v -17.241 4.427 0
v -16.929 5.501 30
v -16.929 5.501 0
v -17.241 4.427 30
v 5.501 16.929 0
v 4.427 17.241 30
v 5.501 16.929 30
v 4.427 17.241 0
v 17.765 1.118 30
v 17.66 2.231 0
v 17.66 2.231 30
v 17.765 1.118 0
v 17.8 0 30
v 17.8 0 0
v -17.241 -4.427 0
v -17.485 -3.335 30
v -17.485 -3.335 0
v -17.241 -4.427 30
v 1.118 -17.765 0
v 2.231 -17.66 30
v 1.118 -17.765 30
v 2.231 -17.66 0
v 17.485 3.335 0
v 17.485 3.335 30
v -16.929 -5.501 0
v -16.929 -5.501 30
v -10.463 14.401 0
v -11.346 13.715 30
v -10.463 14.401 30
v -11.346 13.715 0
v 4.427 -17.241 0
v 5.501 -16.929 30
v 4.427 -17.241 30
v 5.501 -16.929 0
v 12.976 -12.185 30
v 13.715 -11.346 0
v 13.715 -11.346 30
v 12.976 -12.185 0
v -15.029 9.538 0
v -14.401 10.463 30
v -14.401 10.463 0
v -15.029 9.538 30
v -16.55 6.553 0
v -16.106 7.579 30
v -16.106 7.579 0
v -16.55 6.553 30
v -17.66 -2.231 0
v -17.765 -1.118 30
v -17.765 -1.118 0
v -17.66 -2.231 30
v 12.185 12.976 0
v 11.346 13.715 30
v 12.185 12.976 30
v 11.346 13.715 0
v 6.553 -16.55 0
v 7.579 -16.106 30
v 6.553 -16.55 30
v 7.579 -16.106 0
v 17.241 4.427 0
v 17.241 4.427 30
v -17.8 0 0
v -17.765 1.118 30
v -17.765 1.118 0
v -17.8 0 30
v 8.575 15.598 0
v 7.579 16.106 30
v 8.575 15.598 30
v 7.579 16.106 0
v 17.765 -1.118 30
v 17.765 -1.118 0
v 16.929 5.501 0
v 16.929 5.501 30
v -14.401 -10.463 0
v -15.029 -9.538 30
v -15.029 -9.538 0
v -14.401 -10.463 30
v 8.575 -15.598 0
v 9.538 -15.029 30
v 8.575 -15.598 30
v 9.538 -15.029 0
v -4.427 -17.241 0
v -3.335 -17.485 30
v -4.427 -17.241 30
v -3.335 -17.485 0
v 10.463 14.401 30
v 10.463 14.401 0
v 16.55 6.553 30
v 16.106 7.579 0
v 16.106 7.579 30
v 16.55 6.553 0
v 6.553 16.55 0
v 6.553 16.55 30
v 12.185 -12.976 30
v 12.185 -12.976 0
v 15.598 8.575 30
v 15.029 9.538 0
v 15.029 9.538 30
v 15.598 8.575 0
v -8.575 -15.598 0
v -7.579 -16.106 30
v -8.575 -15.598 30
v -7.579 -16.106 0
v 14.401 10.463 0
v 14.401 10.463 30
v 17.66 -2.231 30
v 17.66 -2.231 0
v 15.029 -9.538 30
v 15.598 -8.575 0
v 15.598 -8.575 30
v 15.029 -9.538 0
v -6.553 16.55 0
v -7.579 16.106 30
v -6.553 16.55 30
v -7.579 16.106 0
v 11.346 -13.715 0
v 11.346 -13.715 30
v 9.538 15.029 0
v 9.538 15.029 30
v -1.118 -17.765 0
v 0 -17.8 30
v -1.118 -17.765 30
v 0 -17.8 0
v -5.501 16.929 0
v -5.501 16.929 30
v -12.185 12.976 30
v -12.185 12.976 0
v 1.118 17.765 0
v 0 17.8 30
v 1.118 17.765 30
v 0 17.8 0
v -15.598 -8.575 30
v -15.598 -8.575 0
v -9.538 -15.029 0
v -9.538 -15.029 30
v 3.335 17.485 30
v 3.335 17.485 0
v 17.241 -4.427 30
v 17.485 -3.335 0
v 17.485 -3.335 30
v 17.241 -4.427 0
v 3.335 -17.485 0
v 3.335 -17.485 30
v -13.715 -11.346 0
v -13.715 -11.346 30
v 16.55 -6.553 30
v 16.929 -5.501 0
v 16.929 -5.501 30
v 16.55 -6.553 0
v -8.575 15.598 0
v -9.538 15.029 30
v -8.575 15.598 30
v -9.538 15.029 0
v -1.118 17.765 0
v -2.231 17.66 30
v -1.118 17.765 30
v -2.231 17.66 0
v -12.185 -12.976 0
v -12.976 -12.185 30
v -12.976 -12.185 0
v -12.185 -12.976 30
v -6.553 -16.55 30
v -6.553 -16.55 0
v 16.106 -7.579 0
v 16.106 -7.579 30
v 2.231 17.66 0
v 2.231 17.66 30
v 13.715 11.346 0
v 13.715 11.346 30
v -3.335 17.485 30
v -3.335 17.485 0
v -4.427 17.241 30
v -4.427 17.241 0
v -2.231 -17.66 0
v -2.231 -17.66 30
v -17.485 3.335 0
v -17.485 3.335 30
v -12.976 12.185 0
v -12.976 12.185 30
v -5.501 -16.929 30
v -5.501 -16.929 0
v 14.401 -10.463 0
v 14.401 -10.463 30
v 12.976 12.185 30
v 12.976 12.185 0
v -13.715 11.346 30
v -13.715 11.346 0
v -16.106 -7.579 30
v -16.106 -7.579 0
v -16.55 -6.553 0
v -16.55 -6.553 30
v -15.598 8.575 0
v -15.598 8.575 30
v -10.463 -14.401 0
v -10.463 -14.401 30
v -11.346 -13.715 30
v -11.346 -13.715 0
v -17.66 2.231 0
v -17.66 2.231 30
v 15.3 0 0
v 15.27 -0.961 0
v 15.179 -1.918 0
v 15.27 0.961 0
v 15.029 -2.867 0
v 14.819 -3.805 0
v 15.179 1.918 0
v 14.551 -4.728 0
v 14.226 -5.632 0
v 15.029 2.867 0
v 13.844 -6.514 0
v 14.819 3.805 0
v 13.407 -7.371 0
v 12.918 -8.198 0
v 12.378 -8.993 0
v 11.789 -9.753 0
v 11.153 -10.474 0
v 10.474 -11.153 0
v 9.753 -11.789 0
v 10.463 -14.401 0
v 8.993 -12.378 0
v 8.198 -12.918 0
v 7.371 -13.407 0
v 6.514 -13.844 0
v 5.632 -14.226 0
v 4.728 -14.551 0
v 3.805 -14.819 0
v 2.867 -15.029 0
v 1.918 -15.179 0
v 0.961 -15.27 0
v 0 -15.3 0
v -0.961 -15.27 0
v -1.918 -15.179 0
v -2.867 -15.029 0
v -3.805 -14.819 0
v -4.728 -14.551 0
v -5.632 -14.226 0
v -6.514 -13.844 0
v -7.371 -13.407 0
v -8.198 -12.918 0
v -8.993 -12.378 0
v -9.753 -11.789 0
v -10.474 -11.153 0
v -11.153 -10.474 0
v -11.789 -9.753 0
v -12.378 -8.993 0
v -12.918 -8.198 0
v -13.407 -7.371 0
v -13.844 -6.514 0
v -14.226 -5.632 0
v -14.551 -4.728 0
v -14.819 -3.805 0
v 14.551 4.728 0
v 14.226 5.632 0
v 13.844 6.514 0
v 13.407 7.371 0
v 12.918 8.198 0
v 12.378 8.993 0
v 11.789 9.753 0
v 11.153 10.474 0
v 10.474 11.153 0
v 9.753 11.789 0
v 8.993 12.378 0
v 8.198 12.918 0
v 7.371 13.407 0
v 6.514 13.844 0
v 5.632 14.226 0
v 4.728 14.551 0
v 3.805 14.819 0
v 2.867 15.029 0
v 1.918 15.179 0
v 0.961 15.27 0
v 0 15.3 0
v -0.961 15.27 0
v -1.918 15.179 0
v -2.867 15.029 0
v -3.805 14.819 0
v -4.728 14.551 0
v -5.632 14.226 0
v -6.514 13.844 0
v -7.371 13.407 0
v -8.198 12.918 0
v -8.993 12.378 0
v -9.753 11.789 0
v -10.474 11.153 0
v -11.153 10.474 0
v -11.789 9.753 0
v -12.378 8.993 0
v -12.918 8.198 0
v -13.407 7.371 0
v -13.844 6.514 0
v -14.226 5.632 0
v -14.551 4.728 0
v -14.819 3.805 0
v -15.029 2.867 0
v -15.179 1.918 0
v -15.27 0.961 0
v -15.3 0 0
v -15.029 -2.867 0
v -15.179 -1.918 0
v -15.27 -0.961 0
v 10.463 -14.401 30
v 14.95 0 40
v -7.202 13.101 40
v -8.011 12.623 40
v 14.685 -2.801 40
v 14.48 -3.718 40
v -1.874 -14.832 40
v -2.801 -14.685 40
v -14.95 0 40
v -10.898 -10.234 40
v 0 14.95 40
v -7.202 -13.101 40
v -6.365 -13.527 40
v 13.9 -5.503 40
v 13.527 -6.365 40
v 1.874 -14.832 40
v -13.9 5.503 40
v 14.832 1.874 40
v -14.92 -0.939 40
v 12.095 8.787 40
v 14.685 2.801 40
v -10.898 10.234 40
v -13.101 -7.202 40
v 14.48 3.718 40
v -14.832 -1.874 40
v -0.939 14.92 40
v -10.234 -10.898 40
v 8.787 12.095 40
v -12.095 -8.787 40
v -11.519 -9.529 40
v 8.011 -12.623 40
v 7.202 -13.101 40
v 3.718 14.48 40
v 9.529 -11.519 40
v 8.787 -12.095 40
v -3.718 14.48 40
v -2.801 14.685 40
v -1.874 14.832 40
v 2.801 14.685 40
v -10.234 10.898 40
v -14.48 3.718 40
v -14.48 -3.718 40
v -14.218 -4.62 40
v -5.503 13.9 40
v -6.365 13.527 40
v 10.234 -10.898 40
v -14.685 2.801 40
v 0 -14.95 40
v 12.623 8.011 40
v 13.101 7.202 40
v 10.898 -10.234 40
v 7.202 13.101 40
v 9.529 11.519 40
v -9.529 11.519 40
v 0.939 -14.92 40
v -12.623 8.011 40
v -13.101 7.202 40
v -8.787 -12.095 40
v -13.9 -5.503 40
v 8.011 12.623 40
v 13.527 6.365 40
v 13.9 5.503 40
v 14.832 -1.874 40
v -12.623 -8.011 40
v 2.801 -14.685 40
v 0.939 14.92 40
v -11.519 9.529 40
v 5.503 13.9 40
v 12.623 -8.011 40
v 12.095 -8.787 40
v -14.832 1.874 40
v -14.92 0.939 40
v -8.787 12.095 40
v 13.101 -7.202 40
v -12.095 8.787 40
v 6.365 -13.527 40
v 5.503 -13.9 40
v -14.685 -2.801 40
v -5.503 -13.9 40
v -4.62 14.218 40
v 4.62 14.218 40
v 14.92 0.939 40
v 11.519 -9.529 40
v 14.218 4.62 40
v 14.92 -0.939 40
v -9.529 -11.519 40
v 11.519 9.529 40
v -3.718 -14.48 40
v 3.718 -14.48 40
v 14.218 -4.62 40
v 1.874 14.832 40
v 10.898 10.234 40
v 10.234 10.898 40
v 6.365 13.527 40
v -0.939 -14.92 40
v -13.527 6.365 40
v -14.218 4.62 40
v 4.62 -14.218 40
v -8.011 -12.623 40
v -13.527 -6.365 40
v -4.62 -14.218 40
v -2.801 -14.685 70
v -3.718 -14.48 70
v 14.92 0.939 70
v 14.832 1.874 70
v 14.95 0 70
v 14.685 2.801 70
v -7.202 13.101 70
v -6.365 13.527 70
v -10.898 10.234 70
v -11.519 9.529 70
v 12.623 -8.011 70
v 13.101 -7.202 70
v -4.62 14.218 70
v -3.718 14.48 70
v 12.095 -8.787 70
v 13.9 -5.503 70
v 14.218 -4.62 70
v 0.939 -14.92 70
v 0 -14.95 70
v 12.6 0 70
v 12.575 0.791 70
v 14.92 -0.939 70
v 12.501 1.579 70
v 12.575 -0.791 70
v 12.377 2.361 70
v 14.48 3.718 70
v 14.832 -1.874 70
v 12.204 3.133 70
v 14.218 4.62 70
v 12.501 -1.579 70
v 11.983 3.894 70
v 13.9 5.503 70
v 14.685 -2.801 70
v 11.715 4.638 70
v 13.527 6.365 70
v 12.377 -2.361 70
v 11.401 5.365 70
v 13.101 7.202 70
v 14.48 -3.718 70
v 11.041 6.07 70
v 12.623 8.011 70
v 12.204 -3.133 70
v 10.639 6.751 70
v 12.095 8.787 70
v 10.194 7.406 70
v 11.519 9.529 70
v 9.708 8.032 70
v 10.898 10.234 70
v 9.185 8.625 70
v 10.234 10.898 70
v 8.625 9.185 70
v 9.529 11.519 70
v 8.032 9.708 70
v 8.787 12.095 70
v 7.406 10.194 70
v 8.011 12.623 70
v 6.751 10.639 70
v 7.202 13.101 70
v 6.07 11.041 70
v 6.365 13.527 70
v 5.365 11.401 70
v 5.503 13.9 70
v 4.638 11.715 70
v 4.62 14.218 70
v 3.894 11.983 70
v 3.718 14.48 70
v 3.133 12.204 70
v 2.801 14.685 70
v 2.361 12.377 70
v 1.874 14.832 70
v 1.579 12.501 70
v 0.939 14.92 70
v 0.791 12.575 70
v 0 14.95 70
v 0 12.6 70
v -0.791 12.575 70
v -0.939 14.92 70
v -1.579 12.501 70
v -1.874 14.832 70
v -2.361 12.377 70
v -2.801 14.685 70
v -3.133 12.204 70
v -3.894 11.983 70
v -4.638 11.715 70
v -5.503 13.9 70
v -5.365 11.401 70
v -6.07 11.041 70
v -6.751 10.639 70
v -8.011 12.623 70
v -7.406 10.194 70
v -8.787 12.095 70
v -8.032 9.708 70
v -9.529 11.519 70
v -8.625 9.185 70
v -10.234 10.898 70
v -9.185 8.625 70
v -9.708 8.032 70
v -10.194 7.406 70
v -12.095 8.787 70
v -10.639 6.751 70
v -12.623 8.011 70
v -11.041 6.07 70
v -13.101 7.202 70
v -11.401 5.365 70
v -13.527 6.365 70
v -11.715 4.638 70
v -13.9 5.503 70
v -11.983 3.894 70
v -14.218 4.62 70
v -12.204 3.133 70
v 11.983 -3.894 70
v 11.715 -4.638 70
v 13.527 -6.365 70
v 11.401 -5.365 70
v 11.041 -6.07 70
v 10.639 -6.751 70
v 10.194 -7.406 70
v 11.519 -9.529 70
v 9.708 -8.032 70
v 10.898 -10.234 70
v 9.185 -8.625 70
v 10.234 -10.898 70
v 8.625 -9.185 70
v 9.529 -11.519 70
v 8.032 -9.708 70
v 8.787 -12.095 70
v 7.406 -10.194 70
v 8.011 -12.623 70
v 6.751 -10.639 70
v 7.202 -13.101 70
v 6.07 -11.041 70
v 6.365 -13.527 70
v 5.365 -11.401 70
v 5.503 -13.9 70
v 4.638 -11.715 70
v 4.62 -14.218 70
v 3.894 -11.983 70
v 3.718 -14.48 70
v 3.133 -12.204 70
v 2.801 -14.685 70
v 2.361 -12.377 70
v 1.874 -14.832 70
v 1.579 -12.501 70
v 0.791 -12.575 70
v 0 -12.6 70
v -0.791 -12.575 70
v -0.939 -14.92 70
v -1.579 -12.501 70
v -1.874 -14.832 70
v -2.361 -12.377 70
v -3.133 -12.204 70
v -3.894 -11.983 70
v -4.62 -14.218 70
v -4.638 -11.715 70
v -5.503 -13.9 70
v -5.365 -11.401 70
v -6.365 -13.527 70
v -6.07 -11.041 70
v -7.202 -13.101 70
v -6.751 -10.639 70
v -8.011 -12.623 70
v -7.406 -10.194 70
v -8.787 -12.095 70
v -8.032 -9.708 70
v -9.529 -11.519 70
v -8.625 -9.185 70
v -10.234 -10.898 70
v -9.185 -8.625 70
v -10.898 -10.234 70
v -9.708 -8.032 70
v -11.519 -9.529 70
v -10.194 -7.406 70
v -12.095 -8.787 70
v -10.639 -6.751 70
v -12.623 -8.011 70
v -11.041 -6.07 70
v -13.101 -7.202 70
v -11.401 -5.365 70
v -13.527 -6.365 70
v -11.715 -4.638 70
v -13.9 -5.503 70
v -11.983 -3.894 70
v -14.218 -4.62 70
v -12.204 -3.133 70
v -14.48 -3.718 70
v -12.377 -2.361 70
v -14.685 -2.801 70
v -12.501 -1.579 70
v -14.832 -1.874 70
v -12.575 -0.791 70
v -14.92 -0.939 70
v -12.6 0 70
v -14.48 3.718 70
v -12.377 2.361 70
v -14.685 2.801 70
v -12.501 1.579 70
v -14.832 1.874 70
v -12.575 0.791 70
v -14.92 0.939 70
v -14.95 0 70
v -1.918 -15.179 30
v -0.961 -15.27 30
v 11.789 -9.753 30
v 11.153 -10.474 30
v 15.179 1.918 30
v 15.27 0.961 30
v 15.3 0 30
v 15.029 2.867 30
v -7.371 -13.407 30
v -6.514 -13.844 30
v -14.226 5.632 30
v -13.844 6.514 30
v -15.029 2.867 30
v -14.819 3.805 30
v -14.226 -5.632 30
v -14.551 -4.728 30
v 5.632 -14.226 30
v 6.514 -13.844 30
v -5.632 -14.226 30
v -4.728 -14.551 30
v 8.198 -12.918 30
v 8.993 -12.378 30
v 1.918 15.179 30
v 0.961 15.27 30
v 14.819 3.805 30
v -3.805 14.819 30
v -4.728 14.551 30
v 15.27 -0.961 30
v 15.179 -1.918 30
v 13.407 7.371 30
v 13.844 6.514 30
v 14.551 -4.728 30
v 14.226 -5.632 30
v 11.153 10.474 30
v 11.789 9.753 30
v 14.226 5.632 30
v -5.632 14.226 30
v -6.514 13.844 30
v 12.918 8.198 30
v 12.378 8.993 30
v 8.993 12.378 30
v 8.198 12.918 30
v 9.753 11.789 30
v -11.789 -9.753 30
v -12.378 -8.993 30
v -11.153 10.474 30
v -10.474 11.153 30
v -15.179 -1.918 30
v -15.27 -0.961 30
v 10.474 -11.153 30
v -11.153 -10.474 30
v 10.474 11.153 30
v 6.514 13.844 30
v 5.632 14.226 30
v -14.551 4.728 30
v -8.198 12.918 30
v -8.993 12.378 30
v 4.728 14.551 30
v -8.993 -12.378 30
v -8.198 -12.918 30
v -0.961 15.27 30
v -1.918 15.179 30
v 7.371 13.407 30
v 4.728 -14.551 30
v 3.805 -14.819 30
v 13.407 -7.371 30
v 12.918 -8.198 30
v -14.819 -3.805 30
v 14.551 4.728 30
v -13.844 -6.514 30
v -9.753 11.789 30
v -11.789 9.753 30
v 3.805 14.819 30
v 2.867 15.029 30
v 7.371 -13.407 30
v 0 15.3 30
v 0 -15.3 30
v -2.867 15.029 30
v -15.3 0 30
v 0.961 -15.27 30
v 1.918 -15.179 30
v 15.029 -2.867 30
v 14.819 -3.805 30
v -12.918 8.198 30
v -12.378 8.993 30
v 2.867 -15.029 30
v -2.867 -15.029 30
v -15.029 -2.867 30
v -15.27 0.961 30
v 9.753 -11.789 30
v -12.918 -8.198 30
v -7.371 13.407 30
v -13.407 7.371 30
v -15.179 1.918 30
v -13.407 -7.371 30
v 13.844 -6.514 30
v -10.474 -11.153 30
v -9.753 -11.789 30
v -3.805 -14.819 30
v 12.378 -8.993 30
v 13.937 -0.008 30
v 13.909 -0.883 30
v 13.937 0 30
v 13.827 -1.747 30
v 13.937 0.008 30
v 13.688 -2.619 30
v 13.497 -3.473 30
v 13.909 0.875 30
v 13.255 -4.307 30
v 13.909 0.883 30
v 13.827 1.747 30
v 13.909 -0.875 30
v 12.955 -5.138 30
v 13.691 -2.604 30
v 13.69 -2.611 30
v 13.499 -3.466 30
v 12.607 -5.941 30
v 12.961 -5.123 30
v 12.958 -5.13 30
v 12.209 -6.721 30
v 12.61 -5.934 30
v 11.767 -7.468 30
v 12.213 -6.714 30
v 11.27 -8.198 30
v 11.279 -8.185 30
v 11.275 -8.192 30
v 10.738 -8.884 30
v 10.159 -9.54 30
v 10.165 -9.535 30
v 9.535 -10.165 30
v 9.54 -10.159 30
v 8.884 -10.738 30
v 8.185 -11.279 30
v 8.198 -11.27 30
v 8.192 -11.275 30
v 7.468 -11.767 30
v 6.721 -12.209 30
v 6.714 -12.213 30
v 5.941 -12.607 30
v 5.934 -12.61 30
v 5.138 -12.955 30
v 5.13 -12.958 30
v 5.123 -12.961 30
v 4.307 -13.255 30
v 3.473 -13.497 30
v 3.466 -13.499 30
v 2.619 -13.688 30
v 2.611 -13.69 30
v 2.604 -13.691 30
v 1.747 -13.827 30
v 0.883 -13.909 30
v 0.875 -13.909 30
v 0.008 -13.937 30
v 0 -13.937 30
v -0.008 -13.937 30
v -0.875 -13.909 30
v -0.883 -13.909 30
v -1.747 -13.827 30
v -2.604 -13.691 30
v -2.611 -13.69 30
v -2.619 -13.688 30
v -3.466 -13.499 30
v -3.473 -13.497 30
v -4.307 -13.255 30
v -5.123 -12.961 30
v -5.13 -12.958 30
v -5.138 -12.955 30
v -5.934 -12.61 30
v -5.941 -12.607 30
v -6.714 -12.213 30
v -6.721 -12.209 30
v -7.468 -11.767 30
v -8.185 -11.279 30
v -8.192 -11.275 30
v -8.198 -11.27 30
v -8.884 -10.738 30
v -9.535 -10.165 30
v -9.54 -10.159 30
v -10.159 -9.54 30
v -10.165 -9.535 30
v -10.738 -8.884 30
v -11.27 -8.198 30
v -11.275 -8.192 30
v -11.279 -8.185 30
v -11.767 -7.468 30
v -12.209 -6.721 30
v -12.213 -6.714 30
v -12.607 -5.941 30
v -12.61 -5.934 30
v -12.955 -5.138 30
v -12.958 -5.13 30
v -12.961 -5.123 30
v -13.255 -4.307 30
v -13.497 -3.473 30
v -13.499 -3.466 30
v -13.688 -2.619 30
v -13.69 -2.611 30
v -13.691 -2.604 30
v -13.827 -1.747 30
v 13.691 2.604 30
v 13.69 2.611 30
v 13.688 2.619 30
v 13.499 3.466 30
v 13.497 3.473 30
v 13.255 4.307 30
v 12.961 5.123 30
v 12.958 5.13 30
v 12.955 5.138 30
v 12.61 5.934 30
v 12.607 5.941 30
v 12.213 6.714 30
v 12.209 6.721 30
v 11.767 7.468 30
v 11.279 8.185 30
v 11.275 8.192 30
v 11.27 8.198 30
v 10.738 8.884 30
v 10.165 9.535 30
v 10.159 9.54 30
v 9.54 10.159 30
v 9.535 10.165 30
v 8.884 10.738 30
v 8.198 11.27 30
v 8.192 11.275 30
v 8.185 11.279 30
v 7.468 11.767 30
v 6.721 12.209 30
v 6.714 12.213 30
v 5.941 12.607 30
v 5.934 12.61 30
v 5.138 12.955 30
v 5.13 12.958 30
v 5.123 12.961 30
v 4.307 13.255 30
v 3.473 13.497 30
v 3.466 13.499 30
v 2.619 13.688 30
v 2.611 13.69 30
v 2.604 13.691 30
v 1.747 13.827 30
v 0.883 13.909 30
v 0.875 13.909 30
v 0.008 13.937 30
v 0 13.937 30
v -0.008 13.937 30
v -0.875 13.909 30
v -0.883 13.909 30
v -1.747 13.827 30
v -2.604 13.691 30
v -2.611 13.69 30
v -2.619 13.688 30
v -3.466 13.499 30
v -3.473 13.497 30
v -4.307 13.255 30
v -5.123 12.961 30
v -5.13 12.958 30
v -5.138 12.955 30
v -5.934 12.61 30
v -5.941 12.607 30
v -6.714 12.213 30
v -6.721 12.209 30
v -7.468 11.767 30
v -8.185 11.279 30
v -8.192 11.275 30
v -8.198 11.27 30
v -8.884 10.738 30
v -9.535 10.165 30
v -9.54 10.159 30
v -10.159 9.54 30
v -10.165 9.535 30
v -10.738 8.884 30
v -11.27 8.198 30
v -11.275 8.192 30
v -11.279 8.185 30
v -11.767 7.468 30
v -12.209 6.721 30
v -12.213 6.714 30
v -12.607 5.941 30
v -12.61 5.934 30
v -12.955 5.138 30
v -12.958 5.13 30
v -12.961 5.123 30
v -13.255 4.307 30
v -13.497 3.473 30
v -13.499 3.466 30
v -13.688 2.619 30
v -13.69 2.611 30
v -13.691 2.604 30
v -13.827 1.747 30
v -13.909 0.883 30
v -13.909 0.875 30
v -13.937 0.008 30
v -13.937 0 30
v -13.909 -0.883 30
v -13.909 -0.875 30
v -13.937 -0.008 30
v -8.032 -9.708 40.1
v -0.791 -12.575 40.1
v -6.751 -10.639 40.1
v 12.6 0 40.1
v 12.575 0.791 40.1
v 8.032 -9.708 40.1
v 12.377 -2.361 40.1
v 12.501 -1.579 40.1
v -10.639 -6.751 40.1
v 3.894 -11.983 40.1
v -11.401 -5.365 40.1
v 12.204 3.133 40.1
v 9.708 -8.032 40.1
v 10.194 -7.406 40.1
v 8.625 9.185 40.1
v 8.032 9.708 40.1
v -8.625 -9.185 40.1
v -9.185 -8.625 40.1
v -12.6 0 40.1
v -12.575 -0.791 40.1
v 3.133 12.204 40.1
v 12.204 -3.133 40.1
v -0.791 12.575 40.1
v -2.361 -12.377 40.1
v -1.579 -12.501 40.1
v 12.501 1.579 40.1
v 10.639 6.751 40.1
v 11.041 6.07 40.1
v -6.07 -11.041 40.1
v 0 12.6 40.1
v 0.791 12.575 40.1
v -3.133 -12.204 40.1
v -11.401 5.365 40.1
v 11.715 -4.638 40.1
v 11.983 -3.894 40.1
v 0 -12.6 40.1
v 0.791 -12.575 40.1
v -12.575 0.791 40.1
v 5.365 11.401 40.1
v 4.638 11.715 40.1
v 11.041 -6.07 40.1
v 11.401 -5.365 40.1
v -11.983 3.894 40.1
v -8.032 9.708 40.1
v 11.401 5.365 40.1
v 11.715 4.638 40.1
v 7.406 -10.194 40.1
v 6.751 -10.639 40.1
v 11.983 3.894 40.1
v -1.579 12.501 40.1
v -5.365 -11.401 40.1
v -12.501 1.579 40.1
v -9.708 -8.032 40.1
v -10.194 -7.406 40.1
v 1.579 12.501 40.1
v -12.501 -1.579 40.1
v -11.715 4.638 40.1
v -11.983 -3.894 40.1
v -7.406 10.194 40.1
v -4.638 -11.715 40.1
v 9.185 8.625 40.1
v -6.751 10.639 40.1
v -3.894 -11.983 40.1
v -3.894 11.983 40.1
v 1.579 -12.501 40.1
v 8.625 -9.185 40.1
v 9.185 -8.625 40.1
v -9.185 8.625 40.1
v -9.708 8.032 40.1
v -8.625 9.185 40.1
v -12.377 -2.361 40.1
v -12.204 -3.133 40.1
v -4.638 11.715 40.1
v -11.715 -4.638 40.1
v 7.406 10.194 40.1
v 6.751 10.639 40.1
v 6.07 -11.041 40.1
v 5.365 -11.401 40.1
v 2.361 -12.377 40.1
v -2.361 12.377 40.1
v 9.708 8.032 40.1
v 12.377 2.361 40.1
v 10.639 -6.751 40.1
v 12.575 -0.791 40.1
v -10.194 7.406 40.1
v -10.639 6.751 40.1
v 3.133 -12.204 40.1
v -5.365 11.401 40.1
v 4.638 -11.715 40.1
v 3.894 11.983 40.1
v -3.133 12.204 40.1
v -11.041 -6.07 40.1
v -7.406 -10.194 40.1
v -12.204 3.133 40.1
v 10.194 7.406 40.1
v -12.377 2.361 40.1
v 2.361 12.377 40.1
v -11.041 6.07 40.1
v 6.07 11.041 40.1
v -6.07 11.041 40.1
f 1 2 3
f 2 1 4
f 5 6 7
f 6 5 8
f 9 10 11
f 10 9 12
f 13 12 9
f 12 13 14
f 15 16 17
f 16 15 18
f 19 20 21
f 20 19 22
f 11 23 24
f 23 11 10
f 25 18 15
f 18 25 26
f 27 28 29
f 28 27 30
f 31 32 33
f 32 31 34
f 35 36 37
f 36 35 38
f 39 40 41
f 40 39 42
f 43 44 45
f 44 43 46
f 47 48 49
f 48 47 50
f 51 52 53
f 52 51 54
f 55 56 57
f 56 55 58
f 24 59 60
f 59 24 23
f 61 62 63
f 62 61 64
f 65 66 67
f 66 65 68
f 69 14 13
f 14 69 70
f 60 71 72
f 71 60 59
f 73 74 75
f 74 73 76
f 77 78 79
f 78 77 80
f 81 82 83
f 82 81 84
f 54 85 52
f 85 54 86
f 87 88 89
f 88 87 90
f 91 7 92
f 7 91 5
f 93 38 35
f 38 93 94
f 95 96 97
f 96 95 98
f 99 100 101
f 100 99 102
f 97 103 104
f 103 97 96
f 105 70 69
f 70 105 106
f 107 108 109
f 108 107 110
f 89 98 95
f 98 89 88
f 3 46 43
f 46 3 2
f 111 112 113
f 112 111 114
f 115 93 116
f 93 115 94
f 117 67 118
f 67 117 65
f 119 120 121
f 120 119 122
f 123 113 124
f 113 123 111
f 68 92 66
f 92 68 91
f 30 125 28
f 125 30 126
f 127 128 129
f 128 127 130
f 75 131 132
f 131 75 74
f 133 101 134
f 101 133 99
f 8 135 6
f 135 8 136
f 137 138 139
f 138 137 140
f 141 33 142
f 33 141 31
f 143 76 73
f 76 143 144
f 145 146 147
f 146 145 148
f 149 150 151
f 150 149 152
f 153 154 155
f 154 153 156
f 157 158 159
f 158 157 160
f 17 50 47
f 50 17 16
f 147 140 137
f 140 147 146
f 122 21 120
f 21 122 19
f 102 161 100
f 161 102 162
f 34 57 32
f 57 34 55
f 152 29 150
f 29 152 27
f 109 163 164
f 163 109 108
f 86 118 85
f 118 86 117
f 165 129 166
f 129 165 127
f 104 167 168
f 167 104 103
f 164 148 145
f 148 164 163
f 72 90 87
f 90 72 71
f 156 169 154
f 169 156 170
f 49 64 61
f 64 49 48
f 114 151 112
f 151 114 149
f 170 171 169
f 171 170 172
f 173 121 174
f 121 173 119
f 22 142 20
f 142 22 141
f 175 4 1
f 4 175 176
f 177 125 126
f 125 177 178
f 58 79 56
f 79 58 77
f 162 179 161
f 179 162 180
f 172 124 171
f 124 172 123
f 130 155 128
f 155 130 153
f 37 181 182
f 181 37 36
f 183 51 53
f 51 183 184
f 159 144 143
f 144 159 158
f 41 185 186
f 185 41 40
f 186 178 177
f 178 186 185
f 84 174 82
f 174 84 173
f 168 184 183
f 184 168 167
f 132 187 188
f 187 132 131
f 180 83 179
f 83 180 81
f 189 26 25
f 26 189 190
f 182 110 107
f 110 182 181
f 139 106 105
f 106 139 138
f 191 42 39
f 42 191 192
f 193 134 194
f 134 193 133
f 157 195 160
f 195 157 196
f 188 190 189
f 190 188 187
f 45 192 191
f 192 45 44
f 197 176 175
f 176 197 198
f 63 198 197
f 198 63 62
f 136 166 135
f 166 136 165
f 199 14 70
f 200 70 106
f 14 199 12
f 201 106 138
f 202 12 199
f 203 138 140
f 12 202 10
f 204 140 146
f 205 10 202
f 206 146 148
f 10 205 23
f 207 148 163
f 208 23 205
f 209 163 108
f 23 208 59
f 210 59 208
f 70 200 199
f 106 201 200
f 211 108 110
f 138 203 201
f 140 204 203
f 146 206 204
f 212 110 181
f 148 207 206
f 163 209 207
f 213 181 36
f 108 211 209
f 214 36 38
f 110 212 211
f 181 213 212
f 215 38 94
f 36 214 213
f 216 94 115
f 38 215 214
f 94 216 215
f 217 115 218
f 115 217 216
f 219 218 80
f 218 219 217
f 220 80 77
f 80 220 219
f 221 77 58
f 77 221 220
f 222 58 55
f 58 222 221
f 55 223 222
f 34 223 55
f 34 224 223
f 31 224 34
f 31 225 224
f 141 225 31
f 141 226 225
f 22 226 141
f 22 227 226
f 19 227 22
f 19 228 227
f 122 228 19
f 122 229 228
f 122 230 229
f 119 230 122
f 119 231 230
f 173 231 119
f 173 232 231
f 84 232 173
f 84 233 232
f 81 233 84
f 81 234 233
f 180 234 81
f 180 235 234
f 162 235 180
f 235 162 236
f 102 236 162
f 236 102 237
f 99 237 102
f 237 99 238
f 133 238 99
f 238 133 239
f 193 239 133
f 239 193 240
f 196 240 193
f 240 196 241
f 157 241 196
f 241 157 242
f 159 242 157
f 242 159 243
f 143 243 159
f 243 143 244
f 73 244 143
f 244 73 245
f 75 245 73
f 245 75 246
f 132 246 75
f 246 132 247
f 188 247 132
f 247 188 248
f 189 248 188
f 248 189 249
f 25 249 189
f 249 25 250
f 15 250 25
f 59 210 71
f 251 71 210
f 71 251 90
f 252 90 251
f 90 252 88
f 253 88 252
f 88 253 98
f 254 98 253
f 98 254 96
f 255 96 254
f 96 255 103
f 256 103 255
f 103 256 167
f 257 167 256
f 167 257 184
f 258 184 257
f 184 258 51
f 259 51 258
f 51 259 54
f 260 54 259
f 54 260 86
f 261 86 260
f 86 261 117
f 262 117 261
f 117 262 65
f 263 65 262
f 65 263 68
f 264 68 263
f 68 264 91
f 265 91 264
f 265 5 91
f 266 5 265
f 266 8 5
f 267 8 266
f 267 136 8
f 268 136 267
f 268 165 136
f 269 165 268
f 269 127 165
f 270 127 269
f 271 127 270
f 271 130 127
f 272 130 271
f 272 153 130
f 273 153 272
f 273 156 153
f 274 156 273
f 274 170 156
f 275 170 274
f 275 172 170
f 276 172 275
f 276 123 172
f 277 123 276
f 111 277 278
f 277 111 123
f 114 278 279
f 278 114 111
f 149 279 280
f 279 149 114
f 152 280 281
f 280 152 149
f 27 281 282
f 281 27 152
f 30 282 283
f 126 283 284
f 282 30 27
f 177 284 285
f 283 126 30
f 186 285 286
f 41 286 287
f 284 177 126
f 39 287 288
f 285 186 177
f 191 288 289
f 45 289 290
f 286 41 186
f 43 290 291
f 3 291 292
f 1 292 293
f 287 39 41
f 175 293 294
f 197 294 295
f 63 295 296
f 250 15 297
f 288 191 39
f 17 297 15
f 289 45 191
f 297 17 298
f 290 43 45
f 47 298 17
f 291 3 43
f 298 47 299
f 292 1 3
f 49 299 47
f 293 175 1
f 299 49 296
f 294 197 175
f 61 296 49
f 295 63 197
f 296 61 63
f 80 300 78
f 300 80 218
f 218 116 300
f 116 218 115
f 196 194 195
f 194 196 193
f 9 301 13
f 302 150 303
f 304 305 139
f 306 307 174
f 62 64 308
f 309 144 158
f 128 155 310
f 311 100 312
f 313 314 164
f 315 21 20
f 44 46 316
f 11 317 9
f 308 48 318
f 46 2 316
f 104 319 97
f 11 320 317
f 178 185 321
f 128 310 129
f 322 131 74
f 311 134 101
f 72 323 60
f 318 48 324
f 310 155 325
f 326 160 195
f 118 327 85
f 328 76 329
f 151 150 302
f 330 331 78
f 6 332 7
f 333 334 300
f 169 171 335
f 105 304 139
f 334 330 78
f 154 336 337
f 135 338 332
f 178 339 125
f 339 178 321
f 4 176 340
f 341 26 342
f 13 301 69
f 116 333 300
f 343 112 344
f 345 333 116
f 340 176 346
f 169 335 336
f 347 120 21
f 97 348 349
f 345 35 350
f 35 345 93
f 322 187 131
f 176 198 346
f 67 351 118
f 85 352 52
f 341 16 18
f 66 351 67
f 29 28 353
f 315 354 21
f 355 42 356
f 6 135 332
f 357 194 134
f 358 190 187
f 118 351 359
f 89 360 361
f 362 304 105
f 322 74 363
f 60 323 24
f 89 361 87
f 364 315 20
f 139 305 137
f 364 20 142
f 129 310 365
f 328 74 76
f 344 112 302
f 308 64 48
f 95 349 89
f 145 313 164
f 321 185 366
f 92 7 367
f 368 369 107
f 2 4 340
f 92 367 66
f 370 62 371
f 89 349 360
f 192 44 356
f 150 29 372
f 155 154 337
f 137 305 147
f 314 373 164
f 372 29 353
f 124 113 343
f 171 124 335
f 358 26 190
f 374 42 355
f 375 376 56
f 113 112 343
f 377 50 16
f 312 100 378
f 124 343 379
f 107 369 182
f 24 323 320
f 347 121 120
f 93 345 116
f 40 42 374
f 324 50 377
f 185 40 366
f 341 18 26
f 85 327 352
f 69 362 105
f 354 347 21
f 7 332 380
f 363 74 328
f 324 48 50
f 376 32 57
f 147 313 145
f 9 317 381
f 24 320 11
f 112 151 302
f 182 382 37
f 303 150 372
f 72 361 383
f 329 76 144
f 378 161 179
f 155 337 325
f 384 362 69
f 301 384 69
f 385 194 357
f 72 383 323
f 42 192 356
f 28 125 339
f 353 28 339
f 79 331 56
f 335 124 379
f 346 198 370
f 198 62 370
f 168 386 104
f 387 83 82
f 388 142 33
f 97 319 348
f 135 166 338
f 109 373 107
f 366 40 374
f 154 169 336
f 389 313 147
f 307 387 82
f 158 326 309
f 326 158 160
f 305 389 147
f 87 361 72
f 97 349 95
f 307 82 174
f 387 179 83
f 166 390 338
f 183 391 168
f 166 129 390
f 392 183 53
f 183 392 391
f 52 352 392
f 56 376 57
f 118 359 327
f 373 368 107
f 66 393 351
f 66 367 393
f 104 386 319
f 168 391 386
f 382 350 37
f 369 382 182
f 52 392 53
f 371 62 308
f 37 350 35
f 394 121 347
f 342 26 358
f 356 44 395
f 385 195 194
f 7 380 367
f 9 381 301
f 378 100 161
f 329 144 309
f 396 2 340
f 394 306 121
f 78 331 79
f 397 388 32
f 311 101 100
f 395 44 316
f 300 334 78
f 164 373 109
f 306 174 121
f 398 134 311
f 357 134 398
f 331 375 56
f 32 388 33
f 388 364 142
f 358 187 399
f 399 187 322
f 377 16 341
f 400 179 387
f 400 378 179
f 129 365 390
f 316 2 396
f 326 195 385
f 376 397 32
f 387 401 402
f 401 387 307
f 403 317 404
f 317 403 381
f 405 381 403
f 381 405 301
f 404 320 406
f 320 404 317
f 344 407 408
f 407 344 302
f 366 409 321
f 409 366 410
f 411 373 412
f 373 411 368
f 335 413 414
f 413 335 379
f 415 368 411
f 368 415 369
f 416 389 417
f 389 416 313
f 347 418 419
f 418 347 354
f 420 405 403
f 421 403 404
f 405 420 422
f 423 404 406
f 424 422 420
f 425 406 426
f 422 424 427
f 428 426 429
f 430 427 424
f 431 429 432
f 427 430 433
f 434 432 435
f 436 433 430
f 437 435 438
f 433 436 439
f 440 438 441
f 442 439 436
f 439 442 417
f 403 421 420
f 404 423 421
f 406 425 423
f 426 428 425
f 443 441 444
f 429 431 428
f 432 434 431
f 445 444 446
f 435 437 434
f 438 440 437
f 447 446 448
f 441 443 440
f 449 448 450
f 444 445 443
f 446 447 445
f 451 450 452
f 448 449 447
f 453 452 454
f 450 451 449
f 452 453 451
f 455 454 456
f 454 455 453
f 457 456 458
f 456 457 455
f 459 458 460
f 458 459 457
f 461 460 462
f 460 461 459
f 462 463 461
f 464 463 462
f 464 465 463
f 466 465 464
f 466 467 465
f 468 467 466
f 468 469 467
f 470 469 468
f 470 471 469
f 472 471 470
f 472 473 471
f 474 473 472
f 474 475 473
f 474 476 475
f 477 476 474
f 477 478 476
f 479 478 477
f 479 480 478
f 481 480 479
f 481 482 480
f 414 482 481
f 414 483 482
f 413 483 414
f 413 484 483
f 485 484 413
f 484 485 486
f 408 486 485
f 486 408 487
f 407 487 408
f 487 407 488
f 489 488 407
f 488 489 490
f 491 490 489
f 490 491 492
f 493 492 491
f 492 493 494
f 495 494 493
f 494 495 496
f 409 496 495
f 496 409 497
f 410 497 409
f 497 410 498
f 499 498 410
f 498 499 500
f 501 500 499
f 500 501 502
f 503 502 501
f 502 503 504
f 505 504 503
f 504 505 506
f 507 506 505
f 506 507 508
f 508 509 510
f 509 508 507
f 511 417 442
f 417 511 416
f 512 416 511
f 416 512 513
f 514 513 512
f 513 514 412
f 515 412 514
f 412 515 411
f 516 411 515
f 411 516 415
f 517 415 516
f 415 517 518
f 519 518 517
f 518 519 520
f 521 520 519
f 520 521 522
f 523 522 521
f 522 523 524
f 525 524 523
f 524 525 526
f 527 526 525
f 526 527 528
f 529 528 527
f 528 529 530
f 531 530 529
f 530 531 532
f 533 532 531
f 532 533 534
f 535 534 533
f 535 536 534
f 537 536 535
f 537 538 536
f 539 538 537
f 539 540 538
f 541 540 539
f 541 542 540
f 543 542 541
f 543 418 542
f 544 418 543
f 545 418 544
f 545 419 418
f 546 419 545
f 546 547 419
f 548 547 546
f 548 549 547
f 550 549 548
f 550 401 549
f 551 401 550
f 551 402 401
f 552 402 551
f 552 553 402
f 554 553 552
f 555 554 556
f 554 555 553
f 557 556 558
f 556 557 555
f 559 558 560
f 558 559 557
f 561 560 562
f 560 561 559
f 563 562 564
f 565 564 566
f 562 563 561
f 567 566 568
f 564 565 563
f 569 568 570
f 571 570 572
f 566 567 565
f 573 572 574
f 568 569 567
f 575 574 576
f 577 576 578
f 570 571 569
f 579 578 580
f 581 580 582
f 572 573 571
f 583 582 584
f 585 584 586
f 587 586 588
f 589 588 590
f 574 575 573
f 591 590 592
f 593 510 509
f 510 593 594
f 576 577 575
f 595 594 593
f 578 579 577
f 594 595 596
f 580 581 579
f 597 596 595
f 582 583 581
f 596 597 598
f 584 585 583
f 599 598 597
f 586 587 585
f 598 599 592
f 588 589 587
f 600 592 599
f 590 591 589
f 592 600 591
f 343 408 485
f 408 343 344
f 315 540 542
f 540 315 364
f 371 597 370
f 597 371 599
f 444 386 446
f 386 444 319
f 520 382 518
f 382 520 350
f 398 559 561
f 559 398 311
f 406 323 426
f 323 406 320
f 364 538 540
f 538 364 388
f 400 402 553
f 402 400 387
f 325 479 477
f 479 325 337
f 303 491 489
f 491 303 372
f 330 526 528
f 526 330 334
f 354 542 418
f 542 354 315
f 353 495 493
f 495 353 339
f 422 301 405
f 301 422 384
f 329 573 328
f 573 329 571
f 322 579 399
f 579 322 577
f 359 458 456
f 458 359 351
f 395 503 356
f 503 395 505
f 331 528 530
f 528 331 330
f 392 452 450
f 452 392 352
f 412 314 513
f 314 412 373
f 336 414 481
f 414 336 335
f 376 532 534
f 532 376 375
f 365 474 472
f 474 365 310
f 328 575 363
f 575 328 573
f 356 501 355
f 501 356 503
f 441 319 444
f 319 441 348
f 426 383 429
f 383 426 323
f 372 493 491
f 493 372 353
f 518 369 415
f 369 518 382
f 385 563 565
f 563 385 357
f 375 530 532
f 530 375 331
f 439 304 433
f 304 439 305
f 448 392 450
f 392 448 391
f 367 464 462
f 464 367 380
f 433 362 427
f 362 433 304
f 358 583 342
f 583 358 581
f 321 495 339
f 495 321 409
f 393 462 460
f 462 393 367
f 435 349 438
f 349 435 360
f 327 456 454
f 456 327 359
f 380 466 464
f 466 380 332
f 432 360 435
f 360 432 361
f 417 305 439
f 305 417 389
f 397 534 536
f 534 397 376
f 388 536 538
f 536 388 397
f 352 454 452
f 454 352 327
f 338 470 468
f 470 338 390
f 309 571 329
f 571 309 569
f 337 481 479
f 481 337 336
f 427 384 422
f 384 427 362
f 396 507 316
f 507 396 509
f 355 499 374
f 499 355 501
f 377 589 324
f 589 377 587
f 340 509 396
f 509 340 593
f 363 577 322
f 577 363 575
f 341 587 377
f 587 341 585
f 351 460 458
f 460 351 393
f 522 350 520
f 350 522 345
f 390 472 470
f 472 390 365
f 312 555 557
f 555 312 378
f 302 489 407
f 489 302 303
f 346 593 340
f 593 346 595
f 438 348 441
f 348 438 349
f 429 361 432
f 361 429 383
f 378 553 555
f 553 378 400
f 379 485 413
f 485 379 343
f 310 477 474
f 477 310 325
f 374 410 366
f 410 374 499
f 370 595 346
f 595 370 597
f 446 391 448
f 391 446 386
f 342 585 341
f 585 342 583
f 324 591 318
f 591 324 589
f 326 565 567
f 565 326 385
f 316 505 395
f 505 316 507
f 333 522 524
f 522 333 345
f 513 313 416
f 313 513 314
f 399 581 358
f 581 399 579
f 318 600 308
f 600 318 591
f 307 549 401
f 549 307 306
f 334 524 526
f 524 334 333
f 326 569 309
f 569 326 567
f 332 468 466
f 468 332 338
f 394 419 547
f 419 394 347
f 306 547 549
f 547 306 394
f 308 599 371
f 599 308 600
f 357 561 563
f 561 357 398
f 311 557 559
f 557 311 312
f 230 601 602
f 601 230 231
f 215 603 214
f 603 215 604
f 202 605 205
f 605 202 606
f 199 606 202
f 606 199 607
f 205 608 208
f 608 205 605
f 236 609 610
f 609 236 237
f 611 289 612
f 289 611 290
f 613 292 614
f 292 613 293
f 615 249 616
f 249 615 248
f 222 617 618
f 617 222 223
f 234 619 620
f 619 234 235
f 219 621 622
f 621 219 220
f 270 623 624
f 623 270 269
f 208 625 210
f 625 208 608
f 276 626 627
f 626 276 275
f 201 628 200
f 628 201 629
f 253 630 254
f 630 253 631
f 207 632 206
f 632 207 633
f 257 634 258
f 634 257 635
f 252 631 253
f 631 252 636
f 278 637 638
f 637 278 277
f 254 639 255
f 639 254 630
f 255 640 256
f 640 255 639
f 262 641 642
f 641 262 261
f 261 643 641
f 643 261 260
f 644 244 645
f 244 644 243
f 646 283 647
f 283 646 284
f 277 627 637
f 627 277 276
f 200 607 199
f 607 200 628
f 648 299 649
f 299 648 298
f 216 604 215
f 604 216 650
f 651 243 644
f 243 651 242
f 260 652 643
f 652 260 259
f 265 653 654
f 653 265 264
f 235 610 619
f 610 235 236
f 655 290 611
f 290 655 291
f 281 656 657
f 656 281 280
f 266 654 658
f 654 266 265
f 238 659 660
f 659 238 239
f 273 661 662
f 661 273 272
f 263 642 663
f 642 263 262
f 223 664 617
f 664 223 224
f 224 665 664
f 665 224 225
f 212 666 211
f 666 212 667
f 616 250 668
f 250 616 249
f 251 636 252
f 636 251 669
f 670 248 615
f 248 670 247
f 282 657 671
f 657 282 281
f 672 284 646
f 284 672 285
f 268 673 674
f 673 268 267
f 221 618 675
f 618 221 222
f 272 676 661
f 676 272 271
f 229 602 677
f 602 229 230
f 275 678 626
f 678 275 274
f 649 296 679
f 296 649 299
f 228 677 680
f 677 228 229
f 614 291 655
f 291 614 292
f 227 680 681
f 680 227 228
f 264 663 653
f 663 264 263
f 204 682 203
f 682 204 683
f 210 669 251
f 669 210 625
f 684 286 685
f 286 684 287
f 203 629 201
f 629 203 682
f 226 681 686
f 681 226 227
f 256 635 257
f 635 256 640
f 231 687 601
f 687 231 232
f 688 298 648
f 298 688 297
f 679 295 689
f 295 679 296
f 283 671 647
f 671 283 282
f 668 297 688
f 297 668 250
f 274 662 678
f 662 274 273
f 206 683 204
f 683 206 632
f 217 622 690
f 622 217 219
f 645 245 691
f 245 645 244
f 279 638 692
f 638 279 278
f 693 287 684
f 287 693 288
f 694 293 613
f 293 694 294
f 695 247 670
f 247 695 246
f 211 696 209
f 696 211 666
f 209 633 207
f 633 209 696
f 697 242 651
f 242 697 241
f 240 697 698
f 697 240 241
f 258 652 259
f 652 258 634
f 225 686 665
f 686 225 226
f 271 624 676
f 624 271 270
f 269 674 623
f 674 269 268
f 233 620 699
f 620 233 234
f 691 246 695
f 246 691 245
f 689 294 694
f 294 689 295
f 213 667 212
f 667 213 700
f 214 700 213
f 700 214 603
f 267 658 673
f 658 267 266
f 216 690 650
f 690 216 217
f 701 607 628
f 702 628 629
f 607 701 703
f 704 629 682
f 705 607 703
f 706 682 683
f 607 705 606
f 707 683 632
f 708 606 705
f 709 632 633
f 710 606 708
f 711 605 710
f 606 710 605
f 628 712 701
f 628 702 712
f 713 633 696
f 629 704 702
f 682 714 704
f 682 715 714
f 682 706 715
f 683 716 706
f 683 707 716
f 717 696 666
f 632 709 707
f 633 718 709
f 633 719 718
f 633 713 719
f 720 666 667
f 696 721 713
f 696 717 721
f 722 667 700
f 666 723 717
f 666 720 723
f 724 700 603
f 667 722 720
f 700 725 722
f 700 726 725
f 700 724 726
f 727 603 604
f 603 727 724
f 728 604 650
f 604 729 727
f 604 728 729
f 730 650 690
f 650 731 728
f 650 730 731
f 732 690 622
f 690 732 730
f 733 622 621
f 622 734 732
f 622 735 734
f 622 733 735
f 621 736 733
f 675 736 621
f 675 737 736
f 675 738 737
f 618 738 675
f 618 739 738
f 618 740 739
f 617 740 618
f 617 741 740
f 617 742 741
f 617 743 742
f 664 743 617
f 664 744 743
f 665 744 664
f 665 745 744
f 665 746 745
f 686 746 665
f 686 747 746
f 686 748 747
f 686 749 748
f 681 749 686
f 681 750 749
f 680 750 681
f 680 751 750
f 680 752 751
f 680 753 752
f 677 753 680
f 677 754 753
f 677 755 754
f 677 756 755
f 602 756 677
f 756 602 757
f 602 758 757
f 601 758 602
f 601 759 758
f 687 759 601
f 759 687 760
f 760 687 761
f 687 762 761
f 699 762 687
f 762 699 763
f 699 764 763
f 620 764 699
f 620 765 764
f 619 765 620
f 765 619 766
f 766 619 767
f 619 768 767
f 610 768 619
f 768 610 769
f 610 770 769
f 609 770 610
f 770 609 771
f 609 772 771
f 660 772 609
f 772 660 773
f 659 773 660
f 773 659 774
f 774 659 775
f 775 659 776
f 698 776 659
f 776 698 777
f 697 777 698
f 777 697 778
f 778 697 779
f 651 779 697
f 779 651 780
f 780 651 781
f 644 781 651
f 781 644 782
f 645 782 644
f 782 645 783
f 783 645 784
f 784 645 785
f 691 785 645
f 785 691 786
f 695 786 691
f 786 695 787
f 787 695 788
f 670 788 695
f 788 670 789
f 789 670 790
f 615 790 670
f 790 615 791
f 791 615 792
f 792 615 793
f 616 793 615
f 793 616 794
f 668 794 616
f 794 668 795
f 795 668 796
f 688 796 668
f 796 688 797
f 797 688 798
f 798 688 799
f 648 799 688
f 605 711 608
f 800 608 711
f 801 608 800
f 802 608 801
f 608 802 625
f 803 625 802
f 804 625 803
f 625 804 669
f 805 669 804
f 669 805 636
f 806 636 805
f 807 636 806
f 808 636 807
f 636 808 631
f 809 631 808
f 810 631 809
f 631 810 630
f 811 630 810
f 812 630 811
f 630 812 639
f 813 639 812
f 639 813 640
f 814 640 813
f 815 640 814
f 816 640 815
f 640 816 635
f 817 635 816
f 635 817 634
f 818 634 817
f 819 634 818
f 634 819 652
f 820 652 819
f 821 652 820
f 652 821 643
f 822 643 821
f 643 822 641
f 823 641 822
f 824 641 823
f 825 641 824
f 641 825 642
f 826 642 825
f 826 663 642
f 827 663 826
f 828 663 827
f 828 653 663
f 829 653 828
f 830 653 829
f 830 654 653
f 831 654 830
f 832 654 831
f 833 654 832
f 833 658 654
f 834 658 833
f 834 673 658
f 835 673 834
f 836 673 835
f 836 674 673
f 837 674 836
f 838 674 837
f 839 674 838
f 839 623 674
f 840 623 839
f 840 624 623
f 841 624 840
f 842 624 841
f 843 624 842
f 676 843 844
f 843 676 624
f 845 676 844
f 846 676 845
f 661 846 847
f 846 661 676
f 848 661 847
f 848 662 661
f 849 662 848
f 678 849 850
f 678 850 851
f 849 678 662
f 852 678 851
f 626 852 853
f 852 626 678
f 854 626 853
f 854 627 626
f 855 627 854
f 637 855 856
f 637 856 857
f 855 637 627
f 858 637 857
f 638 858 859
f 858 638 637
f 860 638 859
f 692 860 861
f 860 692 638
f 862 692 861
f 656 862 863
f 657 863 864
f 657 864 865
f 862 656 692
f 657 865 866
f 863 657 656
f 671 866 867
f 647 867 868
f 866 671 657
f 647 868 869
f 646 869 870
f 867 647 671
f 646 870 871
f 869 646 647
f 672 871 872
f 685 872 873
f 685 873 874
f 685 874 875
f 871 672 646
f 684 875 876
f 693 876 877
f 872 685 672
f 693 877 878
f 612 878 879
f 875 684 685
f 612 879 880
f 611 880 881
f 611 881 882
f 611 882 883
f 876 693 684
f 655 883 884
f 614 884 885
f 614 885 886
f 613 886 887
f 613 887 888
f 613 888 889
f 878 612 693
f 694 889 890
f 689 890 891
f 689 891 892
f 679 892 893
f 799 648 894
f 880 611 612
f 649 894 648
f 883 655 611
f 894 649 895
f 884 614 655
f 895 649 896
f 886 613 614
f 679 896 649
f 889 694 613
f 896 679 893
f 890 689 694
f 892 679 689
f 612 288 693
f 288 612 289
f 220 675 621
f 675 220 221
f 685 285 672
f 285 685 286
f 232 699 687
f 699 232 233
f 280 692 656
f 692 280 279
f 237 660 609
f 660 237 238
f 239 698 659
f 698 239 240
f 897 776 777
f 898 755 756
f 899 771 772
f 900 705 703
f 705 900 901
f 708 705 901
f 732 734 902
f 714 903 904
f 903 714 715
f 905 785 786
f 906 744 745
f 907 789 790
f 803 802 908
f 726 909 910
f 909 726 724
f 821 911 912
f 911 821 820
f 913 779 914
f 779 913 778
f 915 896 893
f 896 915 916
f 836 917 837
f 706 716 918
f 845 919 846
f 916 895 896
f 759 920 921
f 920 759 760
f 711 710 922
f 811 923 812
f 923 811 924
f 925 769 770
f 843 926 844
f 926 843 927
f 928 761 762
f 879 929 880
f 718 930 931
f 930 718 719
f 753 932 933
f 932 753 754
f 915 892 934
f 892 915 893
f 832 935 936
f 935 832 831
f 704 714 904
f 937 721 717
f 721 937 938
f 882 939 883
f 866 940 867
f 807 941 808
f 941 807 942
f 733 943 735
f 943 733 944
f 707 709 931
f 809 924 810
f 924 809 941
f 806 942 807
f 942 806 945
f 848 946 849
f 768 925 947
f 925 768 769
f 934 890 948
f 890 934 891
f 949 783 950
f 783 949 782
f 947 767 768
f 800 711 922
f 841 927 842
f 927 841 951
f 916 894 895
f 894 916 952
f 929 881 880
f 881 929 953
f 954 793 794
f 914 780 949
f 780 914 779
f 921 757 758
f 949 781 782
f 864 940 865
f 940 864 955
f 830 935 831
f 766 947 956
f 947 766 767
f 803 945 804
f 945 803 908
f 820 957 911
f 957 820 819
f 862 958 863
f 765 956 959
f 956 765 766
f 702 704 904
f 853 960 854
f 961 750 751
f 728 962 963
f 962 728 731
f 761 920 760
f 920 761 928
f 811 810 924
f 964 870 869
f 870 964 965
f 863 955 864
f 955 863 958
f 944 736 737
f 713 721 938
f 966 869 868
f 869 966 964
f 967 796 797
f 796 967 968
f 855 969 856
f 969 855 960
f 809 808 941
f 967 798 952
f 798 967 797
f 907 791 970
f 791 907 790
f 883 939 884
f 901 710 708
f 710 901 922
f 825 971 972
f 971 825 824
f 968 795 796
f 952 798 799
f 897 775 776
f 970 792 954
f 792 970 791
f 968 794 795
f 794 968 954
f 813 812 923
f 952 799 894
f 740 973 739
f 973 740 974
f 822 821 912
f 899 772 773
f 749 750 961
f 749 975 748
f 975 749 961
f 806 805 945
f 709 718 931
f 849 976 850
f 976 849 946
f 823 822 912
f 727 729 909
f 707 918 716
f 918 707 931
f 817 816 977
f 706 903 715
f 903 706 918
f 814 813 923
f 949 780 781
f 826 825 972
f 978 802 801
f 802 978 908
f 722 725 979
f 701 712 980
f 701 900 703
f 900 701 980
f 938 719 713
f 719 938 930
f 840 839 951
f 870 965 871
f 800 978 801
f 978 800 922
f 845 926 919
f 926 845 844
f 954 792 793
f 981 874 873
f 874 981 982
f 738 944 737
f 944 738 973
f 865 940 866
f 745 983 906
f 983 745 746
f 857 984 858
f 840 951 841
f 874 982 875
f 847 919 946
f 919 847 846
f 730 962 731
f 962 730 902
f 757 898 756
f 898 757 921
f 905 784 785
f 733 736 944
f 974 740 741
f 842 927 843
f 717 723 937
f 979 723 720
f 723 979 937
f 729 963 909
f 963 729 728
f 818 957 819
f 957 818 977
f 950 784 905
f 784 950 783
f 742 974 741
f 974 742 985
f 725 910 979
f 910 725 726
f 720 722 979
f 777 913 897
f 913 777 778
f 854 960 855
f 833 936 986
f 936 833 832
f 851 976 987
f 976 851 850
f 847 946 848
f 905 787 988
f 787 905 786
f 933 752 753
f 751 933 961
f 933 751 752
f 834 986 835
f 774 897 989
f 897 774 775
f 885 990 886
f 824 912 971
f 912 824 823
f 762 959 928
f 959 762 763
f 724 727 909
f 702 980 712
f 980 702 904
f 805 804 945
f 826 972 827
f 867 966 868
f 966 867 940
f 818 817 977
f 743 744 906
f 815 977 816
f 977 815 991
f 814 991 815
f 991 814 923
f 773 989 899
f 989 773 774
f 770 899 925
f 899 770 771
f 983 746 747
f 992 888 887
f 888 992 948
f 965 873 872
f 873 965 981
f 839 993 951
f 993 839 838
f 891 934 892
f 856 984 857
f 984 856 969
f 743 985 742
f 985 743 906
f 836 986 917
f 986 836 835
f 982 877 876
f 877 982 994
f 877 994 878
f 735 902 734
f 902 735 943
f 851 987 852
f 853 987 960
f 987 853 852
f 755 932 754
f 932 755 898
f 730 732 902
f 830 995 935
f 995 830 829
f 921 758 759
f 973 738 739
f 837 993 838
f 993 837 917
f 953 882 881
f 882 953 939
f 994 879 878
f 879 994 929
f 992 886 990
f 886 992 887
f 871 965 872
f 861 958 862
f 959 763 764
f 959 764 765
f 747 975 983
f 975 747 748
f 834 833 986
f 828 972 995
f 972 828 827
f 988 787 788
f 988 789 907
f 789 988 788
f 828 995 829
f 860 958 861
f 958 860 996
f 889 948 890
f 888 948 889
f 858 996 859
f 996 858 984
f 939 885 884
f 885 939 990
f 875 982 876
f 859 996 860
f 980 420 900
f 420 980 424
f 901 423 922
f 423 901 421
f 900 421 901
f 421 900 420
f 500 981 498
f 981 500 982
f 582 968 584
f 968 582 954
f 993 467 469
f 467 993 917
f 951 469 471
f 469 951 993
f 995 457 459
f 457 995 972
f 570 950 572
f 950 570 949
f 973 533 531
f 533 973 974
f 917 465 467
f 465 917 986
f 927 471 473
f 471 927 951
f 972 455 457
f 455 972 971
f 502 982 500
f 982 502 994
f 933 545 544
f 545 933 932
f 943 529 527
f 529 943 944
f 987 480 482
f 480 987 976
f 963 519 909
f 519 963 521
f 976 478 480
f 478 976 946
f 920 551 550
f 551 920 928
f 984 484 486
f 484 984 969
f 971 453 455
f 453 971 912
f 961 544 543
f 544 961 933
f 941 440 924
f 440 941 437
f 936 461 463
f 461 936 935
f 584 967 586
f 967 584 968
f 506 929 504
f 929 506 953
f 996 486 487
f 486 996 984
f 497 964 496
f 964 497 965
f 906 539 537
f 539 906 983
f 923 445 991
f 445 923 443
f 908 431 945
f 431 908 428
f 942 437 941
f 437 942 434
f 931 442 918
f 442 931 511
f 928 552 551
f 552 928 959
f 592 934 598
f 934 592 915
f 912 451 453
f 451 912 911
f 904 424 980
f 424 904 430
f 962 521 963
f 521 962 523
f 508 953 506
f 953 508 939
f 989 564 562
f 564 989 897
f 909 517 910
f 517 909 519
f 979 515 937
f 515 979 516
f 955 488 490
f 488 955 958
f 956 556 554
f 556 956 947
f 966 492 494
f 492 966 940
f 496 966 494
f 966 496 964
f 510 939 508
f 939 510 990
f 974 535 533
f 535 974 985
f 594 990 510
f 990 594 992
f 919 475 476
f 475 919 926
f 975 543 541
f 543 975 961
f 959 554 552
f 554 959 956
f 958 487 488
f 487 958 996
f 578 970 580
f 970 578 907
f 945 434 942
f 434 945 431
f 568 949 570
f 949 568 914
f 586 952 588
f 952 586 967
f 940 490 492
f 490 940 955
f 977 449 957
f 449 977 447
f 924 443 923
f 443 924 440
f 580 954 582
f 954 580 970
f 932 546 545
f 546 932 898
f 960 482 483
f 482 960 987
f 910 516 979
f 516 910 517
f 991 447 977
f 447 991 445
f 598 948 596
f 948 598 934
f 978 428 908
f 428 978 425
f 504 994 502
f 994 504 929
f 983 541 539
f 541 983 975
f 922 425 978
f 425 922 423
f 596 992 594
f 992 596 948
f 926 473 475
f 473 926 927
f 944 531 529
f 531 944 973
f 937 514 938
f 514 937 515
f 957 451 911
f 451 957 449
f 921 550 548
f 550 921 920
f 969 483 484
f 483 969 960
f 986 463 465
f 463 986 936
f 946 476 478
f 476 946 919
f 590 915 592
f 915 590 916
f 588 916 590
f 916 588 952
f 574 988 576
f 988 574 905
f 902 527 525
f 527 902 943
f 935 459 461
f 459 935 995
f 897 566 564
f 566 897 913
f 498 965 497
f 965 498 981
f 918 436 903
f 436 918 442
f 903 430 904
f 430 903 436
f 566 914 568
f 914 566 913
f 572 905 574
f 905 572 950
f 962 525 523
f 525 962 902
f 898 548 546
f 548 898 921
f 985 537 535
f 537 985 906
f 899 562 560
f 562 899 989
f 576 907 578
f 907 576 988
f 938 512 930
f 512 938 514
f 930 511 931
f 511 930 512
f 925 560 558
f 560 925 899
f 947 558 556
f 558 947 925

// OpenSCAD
// --- DIMENSIONS FOR P1S MAX PRINT ---
total_length = 70;     // Max safe height for P1S
insertion_depth = 30;   
wall_thickness = 2.5;   

wide_od = 35.6;
wide_id = 30.6; // ADJUST THIS after your test print

narrow_od = 29.9; 
narrow_id = 25.2;

$fn = 100;

difference() {
    union() {
        cylinder(h = insertion_depth, d = wide_od);
        translate([0, 0, insertion_depth])
            cylinder(h = total_length - (insertion_depth * 2), d1 = wide_od, d2 = narrow_od);
        translate([0, 0, total_length - insertion_depth])
            cylinder(h = insertion_depth, d = narrow_od);
    }

    union() {
        // Female Socket Hole
        translate([0, 0, -1]) 
            cylinder(h = insertion_depth + 1, d = wide_id);
        
        // Internal "Stop" / Transition
        translate([0, 0, insertion_depth - 0.1])
            cylinder(h = total_length - (insertion_depth * 2) + 0.2, d1 = narrow_od - 2, d2 = narrow_id);
        
        // Male Tip Hole
        translate([0, 0, total_length - insertion_depth])
            cylinder(h = insertion_depth + 1, d = narrow_id);
    }
}
